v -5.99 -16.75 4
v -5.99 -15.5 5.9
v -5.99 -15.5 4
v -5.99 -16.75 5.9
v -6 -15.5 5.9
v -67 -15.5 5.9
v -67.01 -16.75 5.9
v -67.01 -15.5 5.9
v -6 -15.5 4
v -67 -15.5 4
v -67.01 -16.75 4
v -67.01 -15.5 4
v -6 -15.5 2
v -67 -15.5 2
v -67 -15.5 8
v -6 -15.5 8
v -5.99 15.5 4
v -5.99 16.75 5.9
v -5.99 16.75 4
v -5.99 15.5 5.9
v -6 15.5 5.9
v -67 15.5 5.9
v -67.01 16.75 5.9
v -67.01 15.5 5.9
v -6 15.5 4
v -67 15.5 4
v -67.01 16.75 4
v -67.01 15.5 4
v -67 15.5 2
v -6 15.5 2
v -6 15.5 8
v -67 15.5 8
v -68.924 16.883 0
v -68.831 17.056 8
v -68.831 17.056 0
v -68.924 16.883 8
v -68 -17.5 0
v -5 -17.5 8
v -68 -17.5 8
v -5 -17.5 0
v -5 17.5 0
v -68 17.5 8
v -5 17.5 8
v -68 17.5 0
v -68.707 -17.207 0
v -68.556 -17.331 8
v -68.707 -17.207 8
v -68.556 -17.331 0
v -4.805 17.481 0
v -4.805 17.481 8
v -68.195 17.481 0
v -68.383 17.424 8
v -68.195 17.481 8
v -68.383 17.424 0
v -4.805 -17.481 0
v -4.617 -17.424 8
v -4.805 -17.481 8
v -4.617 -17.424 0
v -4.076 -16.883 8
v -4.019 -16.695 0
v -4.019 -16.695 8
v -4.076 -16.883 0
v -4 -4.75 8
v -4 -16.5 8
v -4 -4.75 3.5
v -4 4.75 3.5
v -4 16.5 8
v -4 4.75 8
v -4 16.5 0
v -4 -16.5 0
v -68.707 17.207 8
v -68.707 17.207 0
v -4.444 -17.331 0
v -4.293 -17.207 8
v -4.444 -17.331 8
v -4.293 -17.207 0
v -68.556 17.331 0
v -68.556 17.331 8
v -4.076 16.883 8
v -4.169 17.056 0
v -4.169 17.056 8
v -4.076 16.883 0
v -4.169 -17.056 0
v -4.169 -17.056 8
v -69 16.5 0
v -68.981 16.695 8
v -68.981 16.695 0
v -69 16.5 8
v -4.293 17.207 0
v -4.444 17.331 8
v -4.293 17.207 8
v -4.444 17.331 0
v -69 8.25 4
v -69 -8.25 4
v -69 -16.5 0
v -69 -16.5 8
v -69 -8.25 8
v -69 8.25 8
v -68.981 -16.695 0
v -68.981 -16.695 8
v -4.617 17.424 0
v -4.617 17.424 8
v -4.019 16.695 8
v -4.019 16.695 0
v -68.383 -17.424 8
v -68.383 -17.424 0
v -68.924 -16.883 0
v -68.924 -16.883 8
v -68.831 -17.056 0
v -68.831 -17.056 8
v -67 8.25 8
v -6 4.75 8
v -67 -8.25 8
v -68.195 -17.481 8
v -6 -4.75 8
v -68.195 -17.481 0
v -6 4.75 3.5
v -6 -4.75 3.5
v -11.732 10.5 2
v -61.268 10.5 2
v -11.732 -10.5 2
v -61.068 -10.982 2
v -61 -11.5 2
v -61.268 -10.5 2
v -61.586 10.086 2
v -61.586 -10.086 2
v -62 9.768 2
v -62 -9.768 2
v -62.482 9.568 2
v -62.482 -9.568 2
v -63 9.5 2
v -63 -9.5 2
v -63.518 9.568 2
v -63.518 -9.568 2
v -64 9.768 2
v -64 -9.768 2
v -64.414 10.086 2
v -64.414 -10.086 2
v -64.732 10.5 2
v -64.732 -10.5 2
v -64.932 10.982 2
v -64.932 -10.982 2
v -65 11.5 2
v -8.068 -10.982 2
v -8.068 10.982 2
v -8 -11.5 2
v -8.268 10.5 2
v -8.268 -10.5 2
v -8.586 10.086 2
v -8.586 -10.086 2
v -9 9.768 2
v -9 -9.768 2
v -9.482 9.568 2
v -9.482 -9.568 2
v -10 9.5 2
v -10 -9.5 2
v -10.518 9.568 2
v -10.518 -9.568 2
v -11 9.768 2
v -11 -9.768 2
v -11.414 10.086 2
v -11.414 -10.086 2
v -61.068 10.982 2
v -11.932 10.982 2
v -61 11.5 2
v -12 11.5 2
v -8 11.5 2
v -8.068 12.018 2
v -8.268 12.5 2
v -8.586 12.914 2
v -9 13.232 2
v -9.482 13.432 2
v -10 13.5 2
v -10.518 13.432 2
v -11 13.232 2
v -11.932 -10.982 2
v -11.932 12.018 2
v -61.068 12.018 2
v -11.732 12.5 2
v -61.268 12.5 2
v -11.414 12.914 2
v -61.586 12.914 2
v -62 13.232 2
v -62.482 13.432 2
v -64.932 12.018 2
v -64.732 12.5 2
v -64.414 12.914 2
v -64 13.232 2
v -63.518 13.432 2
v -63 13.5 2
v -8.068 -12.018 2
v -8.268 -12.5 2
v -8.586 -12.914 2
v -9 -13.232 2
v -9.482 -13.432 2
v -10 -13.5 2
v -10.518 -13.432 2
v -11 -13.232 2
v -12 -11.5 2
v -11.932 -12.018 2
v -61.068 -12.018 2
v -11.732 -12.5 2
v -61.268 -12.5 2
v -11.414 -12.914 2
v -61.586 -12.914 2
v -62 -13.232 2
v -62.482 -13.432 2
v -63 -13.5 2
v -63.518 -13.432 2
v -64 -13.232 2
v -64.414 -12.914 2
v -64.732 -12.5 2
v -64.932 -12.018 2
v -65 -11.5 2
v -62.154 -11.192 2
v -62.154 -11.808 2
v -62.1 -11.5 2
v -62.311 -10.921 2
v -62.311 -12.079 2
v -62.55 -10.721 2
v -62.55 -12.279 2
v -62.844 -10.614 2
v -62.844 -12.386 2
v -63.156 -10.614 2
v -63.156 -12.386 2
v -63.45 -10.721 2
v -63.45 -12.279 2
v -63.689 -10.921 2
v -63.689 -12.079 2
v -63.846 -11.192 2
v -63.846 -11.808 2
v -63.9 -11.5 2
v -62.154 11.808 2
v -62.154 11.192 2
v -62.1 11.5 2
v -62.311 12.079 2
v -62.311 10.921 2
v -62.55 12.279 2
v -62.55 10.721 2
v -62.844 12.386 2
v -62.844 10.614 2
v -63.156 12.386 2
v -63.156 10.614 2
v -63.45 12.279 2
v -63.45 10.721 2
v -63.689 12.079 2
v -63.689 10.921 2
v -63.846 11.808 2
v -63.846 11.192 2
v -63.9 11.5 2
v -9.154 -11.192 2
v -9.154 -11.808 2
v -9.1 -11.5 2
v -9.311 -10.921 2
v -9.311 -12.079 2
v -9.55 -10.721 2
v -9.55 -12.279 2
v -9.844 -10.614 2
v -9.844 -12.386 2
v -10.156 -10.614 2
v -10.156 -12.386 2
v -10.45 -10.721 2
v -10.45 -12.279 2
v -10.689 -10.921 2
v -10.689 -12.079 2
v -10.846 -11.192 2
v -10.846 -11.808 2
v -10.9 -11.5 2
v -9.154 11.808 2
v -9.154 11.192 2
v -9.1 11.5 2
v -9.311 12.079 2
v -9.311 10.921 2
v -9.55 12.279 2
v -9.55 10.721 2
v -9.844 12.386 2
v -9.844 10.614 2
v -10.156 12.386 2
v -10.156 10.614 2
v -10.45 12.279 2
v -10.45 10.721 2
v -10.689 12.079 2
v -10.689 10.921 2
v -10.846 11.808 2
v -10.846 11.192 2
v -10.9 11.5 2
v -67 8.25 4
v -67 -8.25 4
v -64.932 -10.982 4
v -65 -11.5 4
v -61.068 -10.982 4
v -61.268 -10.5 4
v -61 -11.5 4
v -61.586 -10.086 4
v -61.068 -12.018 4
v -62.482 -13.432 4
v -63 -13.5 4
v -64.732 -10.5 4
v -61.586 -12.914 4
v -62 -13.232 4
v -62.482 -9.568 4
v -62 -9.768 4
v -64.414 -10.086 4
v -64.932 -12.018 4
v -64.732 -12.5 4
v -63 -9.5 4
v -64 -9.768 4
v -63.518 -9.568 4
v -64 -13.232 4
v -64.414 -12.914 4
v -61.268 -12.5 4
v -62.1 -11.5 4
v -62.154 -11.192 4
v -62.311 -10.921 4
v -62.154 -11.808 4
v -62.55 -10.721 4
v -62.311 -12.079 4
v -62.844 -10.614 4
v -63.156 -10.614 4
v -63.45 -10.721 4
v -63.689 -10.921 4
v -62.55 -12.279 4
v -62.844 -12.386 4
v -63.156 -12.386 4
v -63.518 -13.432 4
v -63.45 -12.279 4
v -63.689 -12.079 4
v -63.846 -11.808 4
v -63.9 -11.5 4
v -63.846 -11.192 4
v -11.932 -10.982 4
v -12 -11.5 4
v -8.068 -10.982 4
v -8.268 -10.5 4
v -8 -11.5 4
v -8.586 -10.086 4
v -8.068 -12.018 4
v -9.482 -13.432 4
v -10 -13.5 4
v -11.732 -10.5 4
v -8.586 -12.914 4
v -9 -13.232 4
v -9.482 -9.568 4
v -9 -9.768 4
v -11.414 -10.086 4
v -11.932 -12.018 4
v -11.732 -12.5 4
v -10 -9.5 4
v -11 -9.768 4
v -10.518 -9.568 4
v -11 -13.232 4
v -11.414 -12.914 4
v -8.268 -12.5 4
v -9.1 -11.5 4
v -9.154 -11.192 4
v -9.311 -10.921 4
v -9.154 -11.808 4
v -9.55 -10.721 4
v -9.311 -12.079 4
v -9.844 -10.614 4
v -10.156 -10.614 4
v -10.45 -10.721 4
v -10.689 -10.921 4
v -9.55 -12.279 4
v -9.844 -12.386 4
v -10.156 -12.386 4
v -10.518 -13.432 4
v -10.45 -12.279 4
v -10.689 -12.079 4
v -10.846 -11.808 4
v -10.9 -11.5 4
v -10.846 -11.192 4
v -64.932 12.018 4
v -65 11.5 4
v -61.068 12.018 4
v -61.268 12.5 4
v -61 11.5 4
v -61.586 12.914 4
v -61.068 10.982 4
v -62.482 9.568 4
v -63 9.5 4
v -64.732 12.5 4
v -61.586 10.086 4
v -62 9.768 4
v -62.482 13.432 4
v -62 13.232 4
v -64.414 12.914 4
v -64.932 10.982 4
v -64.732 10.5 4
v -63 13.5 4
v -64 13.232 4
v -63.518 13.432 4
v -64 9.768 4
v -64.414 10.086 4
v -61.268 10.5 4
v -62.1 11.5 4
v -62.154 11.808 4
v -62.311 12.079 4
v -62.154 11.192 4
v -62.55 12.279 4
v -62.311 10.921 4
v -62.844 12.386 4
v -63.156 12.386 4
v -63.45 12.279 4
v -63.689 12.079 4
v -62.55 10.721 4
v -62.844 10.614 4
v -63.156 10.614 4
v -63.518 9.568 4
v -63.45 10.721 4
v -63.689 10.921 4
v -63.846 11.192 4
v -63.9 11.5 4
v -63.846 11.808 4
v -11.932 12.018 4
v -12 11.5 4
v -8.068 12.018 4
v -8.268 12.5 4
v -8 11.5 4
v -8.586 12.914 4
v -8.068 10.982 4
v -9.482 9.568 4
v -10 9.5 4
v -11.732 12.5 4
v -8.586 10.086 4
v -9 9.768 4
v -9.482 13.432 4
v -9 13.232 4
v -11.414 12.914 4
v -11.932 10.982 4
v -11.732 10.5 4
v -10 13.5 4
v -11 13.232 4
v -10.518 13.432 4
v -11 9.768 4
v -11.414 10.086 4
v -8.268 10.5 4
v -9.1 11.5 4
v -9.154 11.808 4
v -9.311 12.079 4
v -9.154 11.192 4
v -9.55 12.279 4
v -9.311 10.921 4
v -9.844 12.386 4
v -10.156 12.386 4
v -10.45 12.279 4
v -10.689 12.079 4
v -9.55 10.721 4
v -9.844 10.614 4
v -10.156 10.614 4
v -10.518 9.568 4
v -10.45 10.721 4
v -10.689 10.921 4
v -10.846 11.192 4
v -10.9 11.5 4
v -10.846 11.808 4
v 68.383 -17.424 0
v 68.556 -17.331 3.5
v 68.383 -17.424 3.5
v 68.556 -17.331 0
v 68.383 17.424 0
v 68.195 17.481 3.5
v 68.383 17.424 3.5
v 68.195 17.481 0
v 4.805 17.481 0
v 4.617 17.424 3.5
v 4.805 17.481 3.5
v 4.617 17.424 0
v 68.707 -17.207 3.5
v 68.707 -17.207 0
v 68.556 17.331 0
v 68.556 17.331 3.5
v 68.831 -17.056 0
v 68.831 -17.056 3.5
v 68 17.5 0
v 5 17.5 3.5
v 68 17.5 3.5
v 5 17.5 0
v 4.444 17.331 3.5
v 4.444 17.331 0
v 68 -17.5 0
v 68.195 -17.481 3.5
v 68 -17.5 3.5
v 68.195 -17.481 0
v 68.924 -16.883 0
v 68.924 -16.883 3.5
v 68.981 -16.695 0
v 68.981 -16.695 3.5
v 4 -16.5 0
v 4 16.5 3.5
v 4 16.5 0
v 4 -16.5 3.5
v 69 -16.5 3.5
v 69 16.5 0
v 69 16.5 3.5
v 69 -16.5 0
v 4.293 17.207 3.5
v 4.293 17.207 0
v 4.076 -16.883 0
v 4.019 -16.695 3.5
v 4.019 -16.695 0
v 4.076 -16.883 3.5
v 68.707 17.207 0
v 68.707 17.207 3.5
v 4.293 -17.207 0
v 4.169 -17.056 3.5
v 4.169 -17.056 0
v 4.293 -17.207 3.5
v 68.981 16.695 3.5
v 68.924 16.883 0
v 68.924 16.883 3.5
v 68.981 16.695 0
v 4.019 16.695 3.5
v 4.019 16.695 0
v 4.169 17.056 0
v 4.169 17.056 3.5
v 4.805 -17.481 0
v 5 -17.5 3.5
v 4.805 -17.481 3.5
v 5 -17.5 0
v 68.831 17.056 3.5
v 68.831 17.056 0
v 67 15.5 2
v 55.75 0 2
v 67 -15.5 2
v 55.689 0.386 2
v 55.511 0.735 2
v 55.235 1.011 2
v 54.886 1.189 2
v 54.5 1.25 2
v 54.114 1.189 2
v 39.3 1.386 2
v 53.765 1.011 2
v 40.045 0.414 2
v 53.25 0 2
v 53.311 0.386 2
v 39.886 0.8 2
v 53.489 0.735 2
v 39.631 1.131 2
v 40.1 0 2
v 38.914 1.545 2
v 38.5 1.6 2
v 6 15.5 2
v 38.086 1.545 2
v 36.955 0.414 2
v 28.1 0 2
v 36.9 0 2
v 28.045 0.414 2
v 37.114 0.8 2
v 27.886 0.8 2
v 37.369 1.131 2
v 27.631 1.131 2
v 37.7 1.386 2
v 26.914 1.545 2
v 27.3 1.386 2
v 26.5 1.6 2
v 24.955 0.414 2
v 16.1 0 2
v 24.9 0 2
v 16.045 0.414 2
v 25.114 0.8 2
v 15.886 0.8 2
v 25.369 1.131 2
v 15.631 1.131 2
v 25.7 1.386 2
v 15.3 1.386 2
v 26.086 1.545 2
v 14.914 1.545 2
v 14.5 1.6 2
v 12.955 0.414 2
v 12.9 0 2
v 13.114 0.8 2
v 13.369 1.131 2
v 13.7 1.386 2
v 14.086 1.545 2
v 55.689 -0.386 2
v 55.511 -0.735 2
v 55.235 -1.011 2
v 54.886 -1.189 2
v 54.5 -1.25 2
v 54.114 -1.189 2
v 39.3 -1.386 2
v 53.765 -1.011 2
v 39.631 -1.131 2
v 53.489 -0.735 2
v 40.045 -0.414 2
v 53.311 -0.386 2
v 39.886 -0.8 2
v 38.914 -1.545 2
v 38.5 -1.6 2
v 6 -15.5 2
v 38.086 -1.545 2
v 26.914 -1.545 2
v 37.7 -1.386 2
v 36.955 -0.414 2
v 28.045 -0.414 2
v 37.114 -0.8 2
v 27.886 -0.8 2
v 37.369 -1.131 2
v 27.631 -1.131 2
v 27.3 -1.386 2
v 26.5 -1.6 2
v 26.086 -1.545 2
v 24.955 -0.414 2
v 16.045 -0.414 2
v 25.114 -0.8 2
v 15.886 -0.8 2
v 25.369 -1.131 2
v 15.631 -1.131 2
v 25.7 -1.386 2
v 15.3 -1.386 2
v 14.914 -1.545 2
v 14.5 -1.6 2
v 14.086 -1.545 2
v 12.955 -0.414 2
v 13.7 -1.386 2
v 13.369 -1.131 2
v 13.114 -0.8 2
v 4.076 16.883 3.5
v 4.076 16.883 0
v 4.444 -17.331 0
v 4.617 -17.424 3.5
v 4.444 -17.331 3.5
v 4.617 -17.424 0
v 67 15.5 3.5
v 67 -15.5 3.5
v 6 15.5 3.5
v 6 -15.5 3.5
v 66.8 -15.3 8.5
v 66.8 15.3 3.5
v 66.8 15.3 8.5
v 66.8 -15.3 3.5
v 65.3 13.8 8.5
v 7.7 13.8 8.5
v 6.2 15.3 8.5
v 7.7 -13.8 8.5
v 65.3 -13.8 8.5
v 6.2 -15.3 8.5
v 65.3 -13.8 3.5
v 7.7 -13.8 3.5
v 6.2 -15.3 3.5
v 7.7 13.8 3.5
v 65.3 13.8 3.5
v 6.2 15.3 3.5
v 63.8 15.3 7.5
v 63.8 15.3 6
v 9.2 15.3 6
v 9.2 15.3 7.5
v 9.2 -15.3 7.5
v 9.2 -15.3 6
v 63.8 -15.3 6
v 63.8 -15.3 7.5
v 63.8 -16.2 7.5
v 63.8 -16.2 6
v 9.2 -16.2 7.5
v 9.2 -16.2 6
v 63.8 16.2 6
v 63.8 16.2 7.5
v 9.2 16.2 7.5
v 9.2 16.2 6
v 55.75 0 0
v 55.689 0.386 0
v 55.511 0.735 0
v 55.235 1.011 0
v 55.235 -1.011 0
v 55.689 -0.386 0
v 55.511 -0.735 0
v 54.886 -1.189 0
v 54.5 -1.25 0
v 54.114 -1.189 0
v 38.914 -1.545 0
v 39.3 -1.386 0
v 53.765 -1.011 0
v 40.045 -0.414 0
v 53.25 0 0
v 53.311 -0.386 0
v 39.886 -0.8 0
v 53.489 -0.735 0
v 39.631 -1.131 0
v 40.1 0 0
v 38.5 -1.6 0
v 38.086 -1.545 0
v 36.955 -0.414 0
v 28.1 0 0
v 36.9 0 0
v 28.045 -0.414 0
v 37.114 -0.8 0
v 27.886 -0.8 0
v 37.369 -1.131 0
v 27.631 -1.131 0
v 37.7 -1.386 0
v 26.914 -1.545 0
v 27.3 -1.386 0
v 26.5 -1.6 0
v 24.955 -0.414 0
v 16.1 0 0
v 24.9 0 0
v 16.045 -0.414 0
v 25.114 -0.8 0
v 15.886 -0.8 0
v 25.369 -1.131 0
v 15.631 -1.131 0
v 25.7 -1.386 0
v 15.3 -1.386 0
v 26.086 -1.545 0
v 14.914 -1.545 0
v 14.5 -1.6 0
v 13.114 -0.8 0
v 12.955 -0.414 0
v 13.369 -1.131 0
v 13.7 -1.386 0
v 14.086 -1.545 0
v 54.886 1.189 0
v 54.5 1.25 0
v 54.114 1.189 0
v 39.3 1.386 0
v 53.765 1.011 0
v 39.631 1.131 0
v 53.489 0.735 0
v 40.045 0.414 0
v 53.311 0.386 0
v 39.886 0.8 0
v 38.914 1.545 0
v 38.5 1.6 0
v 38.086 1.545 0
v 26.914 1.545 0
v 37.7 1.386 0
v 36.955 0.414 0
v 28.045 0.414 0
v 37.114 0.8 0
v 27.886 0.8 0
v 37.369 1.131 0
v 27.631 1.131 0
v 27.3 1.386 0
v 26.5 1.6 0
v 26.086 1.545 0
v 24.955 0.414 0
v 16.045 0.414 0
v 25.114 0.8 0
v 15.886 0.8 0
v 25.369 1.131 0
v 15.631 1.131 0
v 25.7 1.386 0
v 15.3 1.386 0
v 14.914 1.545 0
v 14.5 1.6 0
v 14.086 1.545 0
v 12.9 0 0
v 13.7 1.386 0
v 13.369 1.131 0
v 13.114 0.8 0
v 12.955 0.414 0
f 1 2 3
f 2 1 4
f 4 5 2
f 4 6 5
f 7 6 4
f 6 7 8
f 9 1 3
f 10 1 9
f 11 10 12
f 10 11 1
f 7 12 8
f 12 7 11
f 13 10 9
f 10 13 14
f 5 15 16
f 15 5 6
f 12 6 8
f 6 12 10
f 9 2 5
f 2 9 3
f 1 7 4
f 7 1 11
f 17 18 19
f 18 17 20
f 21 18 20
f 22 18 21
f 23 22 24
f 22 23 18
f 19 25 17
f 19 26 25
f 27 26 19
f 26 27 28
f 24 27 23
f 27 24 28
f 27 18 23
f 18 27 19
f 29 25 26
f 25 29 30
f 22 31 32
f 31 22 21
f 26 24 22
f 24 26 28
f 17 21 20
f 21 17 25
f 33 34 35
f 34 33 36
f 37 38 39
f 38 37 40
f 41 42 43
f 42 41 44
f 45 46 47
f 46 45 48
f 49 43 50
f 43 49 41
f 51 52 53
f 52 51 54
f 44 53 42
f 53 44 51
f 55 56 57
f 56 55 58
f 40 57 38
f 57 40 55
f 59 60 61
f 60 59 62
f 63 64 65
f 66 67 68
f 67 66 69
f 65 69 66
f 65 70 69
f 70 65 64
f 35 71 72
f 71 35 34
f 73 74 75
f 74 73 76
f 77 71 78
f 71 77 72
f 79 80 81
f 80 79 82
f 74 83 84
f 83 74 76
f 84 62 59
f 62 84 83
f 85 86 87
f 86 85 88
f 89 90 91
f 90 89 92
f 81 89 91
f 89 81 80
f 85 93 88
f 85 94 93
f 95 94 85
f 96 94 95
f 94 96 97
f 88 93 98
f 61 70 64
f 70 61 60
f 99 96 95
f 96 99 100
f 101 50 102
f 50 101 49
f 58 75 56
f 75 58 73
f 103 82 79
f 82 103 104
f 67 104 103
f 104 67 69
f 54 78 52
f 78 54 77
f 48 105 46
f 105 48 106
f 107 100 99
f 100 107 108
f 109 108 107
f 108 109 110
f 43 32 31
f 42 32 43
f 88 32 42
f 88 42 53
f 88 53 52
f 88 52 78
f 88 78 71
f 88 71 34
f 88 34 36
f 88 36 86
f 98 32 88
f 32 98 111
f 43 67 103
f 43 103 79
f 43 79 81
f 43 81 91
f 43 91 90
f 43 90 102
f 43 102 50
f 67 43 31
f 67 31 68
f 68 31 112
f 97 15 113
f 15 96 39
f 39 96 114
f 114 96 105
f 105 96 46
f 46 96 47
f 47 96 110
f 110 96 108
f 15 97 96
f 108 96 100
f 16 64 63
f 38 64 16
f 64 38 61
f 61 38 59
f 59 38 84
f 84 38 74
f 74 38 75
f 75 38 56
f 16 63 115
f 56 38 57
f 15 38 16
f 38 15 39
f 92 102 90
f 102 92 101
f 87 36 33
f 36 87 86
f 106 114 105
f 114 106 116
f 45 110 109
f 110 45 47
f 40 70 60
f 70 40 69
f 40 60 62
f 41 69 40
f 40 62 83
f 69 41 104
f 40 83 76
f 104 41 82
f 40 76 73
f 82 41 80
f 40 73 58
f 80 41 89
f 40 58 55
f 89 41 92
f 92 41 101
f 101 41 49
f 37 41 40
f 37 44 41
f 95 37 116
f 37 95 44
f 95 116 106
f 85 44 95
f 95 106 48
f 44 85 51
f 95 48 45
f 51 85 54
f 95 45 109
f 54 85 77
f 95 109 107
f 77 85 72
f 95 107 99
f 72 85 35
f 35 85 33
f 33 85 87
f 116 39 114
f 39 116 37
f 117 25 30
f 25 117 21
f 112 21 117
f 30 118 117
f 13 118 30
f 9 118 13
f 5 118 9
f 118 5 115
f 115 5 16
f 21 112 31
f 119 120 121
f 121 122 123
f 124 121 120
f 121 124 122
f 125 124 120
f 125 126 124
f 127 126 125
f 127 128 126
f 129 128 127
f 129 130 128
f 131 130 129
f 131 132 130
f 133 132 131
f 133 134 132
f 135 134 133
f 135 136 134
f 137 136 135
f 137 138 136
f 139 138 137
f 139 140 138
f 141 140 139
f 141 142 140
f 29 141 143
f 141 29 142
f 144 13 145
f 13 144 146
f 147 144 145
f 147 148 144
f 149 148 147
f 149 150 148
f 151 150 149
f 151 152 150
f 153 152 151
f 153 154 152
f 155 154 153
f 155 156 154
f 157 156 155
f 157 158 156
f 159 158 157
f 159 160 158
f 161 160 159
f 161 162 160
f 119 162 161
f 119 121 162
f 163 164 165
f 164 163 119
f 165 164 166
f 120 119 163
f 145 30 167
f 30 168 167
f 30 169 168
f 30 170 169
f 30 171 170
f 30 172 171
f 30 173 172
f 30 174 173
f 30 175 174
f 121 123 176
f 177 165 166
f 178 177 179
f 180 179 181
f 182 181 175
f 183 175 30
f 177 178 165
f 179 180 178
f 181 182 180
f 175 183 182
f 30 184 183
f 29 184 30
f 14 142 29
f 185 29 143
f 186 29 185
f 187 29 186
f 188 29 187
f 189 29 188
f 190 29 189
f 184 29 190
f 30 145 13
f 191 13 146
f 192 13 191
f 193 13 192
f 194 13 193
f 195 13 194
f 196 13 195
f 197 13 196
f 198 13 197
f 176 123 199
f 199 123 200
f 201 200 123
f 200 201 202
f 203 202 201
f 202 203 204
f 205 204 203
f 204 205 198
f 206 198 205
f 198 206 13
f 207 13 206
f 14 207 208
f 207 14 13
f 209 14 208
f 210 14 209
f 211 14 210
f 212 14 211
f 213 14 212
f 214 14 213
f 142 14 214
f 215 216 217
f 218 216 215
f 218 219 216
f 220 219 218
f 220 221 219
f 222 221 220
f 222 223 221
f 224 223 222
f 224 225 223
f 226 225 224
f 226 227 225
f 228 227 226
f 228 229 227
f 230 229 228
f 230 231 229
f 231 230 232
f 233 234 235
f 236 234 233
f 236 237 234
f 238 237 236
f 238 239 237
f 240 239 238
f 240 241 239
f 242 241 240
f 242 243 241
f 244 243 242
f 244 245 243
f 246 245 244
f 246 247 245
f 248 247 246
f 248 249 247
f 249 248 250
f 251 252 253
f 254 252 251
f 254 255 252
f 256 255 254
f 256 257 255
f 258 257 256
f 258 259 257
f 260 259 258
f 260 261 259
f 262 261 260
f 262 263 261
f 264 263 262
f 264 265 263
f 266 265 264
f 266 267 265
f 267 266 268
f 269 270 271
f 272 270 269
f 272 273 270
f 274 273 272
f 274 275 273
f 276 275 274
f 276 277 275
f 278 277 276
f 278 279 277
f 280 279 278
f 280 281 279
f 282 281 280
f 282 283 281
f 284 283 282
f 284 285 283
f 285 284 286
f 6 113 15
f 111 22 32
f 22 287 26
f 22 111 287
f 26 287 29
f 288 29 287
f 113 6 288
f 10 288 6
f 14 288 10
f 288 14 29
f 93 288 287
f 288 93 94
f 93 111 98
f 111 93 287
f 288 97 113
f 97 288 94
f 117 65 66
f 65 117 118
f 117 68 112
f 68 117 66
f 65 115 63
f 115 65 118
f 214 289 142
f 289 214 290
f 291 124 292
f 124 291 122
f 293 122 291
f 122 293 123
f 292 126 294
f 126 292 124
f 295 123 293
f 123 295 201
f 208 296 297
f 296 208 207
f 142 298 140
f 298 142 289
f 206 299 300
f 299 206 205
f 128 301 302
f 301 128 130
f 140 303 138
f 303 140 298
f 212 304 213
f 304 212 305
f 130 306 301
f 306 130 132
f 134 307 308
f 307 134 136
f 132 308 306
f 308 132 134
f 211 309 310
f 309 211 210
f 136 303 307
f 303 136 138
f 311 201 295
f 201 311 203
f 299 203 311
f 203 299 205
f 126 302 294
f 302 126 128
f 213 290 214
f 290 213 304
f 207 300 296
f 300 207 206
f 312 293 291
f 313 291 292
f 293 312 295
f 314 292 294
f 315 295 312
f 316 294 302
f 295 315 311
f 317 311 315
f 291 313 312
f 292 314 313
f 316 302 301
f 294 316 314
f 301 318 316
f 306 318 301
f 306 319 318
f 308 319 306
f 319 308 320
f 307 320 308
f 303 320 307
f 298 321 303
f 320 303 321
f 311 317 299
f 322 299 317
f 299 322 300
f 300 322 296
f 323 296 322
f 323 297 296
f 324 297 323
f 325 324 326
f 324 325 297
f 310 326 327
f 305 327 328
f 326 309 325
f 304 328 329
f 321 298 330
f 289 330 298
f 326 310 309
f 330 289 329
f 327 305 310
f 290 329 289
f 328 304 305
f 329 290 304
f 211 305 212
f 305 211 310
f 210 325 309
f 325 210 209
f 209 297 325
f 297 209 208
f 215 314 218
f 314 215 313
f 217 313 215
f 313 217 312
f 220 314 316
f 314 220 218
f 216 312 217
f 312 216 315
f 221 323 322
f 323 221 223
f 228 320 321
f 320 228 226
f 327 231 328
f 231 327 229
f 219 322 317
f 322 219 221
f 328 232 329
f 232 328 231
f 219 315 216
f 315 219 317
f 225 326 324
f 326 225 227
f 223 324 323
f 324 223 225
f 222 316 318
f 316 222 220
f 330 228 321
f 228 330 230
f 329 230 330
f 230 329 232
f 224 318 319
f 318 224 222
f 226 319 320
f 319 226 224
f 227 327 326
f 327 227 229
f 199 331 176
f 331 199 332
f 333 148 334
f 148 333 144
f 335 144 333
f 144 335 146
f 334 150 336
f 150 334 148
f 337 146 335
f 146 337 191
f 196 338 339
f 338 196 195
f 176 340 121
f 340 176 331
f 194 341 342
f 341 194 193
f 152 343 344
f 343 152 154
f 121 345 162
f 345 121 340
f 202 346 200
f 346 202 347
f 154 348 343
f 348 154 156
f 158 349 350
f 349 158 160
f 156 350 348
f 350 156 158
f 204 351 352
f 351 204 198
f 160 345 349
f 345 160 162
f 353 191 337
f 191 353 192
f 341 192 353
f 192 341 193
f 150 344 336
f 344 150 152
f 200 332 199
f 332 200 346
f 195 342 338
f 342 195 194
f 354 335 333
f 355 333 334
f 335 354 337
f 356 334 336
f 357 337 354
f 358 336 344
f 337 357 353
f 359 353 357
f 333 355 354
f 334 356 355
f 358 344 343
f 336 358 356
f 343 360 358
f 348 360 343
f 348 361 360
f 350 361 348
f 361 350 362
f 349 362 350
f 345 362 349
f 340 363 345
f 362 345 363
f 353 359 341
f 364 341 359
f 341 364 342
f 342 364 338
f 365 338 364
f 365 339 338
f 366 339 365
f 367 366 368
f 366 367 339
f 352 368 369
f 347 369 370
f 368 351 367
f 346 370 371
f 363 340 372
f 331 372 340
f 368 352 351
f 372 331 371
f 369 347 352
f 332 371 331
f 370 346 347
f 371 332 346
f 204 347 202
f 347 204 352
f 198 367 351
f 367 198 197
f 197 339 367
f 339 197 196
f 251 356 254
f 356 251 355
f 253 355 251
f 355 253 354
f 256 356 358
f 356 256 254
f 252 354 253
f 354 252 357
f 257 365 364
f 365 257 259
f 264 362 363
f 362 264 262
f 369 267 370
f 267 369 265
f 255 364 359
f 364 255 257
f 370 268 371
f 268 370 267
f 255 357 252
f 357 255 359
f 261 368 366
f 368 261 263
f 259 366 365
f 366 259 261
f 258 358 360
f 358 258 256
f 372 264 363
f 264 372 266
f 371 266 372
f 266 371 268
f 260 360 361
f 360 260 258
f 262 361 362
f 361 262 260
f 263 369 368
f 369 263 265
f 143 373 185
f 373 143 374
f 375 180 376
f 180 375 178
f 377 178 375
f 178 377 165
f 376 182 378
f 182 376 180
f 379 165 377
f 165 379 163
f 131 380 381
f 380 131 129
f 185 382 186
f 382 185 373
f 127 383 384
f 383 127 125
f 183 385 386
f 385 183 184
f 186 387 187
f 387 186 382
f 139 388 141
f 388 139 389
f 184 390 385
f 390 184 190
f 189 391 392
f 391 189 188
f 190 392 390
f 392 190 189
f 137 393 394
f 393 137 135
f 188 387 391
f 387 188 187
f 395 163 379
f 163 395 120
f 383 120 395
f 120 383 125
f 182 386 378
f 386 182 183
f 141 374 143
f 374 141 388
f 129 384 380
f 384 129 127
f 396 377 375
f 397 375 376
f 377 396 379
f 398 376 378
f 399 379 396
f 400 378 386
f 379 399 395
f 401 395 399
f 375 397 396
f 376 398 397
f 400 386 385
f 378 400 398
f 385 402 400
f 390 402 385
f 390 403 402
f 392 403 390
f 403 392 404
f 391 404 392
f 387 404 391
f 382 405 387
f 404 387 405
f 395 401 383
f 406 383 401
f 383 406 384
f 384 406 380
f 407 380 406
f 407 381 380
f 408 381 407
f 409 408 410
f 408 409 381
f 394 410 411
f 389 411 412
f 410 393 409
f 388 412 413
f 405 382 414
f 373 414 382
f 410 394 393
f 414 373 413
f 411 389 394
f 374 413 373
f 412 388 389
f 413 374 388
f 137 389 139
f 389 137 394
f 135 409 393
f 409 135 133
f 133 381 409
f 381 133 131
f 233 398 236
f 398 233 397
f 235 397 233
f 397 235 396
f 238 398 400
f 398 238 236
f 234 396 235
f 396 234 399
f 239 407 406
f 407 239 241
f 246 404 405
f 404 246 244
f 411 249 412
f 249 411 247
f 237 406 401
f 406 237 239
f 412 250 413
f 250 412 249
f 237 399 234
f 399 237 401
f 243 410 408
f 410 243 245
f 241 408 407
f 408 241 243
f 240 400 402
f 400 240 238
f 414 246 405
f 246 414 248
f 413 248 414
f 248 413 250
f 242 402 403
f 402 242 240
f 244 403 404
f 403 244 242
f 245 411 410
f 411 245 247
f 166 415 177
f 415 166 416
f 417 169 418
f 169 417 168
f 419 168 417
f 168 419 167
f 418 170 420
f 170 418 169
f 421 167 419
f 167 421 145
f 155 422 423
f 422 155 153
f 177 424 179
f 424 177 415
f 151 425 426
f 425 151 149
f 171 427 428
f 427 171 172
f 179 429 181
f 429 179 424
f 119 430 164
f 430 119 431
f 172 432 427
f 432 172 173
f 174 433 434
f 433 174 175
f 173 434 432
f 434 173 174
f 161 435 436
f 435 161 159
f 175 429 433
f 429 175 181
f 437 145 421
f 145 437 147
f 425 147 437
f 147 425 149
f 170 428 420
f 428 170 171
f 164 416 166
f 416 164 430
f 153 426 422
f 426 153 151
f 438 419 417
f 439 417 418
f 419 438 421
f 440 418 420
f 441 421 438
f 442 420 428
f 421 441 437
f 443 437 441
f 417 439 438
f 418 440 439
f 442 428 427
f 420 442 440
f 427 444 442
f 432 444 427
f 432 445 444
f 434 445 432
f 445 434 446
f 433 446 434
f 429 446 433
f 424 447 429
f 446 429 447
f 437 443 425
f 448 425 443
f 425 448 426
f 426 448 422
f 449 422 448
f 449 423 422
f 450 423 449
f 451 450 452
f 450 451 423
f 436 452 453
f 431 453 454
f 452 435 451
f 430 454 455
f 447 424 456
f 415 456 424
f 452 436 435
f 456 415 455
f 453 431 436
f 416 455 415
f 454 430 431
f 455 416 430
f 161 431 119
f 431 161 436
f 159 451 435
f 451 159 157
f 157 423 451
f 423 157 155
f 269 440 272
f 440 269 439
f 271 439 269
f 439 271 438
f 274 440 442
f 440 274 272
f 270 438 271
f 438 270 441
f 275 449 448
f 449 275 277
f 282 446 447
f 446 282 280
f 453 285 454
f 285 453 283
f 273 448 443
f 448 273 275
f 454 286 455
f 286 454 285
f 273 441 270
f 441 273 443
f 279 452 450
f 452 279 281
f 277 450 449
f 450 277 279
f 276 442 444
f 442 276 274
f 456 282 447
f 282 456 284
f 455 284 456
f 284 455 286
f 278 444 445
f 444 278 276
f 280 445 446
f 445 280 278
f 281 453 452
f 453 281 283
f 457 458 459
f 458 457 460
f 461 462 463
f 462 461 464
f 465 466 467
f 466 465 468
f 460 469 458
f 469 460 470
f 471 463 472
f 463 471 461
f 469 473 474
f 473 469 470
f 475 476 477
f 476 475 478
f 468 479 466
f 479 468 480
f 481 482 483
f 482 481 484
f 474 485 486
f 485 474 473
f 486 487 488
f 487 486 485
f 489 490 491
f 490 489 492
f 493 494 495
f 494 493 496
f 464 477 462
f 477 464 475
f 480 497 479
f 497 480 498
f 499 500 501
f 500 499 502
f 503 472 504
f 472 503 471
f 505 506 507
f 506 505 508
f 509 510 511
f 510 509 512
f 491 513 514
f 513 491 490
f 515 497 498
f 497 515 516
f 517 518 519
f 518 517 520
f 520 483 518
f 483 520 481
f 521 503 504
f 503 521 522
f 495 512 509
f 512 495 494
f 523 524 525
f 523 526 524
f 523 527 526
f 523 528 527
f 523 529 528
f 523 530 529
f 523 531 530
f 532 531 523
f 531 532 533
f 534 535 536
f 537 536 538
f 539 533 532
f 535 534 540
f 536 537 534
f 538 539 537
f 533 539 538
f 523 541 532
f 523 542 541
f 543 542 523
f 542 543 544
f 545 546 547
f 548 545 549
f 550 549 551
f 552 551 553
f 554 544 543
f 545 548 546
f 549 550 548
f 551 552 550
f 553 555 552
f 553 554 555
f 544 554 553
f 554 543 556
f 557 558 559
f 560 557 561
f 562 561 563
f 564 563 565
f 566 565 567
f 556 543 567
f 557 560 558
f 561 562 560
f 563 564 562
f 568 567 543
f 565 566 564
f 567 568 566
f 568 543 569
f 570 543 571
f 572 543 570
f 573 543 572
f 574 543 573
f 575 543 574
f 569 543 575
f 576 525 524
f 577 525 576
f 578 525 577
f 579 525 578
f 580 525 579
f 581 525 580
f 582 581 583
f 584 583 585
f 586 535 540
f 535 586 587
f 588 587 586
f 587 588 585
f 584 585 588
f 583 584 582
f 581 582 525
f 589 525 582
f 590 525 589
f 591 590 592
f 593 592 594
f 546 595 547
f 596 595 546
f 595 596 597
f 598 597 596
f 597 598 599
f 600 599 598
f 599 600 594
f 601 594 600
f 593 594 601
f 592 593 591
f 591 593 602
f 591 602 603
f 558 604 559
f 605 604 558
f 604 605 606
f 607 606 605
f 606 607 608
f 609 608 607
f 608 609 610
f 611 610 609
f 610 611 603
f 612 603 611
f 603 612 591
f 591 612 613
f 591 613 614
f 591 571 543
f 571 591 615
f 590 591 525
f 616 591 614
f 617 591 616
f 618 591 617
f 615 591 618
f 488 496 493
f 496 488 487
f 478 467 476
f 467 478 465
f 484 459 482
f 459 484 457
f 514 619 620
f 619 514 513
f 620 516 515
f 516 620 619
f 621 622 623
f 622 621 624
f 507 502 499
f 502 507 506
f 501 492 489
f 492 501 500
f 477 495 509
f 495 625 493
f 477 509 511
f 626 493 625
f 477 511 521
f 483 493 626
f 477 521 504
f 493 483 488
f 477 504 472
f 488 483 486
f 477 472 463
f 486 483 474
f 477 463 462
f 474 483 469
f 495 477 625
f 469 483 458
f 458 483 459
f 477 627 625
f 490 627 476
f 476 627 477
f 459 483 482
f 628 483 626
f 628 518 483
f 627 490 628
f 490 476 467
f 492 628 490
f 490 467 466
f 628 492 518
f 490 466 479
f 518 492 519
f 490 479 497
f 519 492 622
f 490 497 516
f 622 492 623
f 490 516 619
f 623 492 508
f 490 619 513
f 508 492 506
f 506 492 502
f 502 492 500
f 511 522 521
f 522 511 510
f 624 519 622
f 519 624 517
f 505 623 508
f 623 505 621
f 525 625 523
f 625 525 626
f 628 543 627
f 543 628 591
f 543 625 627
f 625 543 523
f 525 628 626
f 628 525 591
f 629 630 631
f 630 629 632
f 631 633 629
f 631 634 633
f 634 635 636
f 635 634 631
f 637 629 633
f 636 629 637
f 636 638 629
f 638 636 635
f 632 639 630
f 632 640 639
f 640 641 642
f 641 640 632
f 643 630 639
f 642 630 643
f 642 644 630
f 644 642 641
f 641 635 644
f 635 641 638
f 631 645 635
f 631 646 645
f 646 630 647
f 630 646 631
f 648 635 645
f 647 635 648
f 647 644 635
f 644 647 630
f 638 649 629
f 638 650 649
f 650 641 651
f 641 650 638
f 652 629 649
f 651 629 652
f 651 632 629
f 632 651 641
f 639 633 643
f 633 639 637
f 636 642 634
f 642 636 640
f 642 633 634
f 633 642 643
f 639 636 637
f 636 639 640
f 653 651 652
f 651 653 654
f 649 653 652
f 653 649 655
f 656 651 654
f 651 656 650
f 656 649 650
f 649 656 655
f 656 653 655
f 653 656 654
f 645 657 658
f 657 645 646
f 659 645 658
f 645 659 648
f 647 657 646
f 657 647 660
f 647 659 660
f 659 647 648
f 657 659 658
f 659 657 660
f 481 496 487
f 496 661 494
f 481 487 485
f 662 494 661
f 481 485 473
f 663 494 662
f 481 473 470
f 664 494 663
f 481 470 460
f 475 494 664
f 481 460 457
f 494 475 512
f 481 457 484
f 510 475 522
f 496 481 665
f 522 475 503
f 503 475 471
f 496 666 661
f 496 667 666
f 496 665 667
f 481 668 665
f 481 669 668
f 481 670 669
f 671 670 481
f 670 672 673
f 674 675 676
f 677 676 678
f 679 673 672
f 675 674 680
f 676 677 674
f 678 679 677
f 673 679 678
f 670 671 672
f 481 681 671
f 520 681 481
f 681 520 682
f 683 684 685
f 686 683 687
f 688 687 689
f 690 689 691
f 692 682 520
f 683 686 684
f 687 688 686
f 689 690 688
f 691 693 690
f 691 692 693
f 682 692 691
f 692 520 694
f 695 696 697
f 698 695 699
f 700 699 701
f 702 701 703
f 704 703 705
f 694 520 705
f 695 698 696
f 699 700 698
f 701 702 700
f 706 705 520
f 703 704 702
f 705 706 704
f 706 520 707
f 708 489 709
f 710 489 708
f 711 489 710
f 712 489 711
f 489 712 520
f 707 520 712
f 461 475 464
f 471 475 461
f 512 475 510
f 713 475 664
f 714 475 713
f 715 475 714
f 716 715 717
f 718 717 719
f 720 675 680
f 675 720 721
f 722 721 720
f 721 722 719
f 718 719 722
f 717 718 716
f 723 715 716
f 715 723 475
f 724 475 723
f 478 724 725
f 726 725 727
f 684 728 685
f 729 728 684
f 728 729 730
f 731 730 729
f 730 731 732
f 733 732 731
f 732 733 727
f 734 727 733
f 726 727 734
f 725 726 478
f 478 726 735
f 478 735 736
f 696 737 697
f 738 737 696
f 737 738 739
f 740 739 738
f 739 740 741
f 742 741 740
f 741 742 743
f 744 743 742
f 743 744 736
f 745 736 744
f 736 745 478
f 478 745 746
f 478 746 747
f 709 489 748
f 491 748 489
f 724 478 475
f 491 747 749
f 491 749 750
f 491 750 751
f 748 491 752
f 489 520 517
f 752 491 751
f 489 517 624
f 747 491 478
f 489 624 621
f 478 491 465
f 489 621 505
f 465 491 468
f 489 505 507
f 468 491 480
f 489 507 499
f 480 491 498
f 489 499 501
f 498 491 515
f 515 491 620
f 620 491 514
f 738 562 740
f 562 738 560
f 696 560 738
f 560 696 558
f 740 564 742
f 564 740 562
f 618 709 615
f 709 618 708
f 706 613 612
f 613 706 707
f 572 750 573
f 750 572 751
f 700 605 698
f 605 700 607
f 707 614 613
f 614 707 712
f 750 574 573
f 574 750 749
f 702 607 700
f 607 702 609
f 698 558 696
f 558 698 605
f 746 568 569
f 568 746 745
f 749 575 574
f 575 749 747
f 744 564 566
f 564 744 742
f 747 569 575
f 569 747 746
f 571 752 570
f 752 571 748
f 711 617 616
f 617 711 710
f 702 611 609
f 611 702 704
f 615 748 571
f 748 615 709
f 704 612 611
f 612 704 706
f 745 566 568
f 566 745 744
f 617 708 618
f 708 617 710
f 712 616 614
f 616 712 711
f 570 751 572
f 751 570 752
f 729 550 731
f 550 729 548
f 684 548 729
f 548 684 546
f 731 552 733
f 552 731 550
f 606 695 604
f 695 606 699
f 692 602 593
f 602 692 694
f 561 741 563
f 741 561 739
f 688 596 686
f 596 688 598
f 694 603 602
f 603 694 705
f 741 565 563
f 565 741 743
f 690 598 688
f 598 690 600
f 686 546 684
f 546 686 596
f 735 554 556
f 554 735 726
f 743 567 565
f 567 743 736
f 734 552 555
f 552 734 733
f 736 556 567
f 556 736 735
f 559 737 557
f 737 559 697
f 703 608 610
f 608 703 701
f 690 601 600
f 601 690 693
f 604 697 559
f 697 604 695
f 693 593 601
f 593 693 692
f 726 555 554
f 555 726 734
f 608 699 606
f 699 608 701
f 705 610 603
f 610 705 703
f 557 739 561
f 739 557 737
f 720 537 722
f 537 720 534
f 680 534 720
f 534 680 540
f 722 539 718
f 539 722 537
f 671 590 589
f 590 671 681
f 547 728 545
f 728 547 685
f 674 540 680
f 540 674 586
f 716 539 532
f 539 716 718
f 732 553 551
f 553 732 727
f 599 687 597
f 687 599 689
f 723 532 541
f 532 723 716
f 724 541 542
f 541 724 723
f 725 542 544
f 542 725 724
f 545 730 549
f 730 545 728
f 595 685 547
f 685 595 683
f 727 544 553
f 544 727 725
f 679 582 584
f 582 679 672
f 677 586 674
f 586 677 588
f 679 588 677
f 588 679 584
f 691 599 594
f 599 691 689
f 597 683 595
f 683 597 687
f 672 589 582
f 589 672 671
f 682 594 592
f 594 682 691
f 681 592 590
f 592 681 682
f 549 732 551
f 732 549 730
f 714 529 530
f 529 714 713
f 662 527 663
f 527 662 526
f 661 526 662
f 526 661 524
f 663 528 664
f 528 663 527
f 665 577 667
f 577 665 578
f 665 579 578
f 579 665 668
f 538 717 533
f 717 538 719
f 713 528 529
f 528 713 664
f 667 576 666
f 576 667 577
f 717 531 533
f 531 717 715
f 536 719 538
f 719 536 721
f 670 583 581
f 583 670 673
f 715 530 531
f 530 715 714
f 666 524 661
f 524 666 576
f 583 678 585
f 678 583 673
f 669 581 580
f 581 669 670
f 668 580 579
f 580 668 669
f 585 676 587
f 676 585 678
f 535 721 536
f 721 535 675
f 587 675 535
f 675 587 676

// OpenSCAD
// PoEt Rev A — parametric snap-fit enclosure
// Board: 60 × 30 mm, 4-layer, 1.6 mm thick
//
// Print orientation (both parts are already in print-ready orientation)
//   Bottom shell : open face UP  — no rotation needed
//   Top shell    : ceiling face DOWN (Z=0) — no rotation needed; skirt prints upward
//                  Flip physically to assemble: press skirt into bottom shell until beads click
//
// VERIFY clr_top and all connector dimensions against real parts before printing.
// Print a single-wall cross-section first.

/* ═══ Board dimensions ═══════════════════════════════════════════════════ */
pcb_l = 60.0;   // board length (X)
pcb_w = 30.0;   // board width  (Y)
pcb_t =  1.6;   // board thickness

/* ═══ Interior clearances ════════════════════════════════════════════════ */
clr_bot  = 2.0;  // floor to PCB bottom  (standoff height)
clr_top  = 12.0; // PCB top to ceiling inner face
                  // T1 transformer (Würth 750313638) ≈ 10 mm → 12 mm = 2 mm headroom
clr_side = 0.5;  // per-side gap between PCB edge and inner wall

/* ═══ Wall & snap geometry ═══════════════════════════════════════════════ */
wall    = 2.0;   // shell wall thickness
skirt_t = 1.5;   // top-shell inner skirt thickness
overlap = 5.0;   // skirt insertion depth into bottom shell
fit_gap = 0.2;   // radial clearance: skirt OD vs cavity ID (each side)

bead_h  = 1.5;   // snap bead height (Z)
bead_d  = 0.9;   // snap bead radial depth (into wall groove)
grove_tol = 0.2; // extra groove width per side for tolerance

/* ═══ Connector cutouts ══════════════════════════════════════════════════ */
// RJ45 — Bel Fuse 0826-1G1T-DV-F, back face (X-min end, "PAIR" end of board)
rj45_w = 16.5;  // opening width  (Y)  — verify against datasheet
rj45_h = 14.5;  // opening height (Z)  — includes LED indicators above body

// USB-C — GCT USB4105-GF-A mid-mount, front face (X-max end of board)
usbc_w =  9.5;  // opening width  (Y)
usbc_h =  4.5;  // opening height (Z): mid-mount body ≈ 3.3 mm + plug clearance

/* ═══ LED windows — top face ══════════════════════════════════════════════ */
// LED1=LINK (green), LED2=ACT (yellow), LED3=PWR (blue); see docs/bom.md.
// Positions measured from X=0 (RJ45 end) of PCB. Adjust to match KiCad layout.
led_dia  = 3.2;          // window bore (slightly over 3 mm LED lens)
led_xpos = [8, 20, 32];  // X from RJ45 end (PCB coords)
led_ypos = 15.0;         // Y from Y=0 edge (PCB coord, = board centre)

/* ═══ Reset-button pinhole ════════════════════════════════════════════════ */
// SW1 tact switch (Sheet 04). Adjust to match KiCad placement.
sw_dia  = 2.5;   // bore for a 2 mm tool
sw_xpos = 48.0;  // X from RJ45 end (PCB coord)
sw_ypos = 15.0;  // Y from Y=0 edge (PCB coord)

/* ═══ PCB standoffs ══════════════════════════════════════════════════════ */
so_od = 4.0;  // standoff outer diameter
so_id = 1.8;  // screw bore (M2 self-tap); set to 0 for solid boss
// Standoff XY centres in PCB coordinates (from PCB corner at X=0, Y=0)
so_pos = [[3.5, 3.5], [56.5, 3.5], [3.5, 26.5], [56.5, 26.5]];

/* ═══ Derived dimensions ══════════════════════════════════════════════════ */
out_l = pcb_l + 2*clr_side + 2*wall;
out_w = pcb_w + 2*clr_side + 2*wall;

// Bottom shell height: tall enough so groove doesn't punch through floor
// floor=wall, clr_bot=2, pcb_t=1.6 → floor-to-PCB-top = 5.6; add 2 mm above PCB
bot_h = max(8.0, wall + clr_bot + pcb_t + 2.0);

// Top shell height (ceiling plate + headroom above PCB)
top_h = wall + clr_top;

// Inner cavity XY (the hollow inside the shell walls)
cav_l = out_l - 2*wall;
cav_w = out_w - 2*wall;

// Snap groove in bottom-shell inner wall, measured from shell floor
groove_w   = bead_h + 2*grove_tol;
groove_z   = bot_h - 2.5 - bead_h;   // 2.5 mm below top rim
groove_dep = fit_gap + bead_d + 0.15; // depth cut into inner wall face

// Snap bead on skirt (Z from skirt bottom) aligned with groove when assembled
bead_z_sk = groove_z - bot_h + overlap;

// Skirt outer and inner dimensions (centred in XY)
sk_ol = cav_l - 2*fit_gap;  // skirt outer length
sk_ow = cav_w - 2*fit_gap;  // skirt outer width
sk_il = sk_ol - 2*skirt_t;  // skirt inner length
sk_iw = sk_ow - 2*skirt_t;  // skirt inner width

// Origin used throughout: shell body centred in XY, floor at Z=0
// PCB origin (X=0,Y=0 corner of board) maps to shell coords:
//   pcb_x0 = -out_l/2 + wall + clr_side
//   pcb_y0 = -out_w/2 + wall + clr_side

function pcb2x(x) = -out_l/2 + wall + clr_side + x;
function pcb2y(y) = -out_w/2 + wall + clr_side + y;

/* ═══ Utility ════════════════════════════════════════════════════════════ */
module rbox(l, w, h, r=1.0) {
    // Rounded-corner box, centred in XY, bottom at Z=0
    hull()
        for (sx=[-1,1], sy=[-1,1])
            translate([sx*(l/2-r), sy*(w/2-r), 0])
                cylinder(r=r, h=h, $fn=32);
}

module ccube(lx, ly, lz) {
    // Cube centred in XY, bottom at Z=0
    translate([-lx/2, -ly/2, 0]) cube([lx, ly, lz]);
}

/* ═══ Bottom shell ═══════════════════════════════════════════════════════ */
module bottom_shell() {
    difference() {
        rbox(out_l, out_w, bot_h);

        // ── Interior cavity (open top) ───────────────────────────────── //
        translate([0, 0, wall])
            ccube(cav_l, cav_w, bot_h);  // extra height is fine — just removes air

        // ── Snap grooves in the two long inner walls (+Y and -Y) ─────── //
        // Cut a channel outward from the inner face into the wall material
        for (sy = [-1, 1]) {
            // inner face at y = sy*cav_w/2; groove goes further out by groove_dep
            gy = sy * (cav_w/2 + groove_dep/2);
            translate([0, gy, groove_z + groove_w/2])
                cube([cav_l + 0.02, groove_dep, groove_w], center=true);
        }

        // ── RJ45 cutout — back face (X = -out_l/2) ──────────────────── //
        // Board sits so the RJ45 end is at the -X wall
        translate([-out_l/2 - 0.01,
                   -rj45_w/2,
                   wall + clr_bot])
            cube([wall + 0.02, rj45_w, rj45_h]);

        // ── USB-C cutout — front face (X = +out_l/2) ────────────────── //
        // Mid-mount: opening from just above floor to usbc_h
        translate([out_l/2 - wall - 0.01,
                   -usbc_w/2,
                   wall + clr_bot - 0.5])   // 0.5 mm below PCB-bottom floor
            cube([wall + 0.02, usbc_w, usbc_h + 1.0]);
    }

    // ── PCB standoffs ────────────────────────────────────────────────── //
    for (p = so_pos) {
        translate([pcb2x(p[0]), pcb2y(p[1]), wall])
            difference() {
                cylinder(d=so_od, h=clr_bot, $fn=24);
                if (so_id > 0)
                    cylinder(d=so_id, h=clr_bot + 0.01, $fn=18);
            }
    }
}

/* ═══ Top shell ══════════════════════════════════════════════════════════ */
// Print orientation: Z=0 = ceiling outer face (on bed); everything else
// extends upward in positive Z (rim, skirt, beads all point toward sky while
// printing). In the assembled case, the top shell is flipped so the ceiling
// faces upward and the skirt drops into the bottom shell.
//
// Z landmarks (in print orientation, Z=0 on bed):
//   0               ceiling outer face (bed)
//   wall            ceiling inner face
//   wall+rim_h      top of cosmetic rim
//   wall+rim_h+overlap  top of skirt (= shell interior side)
module top_shell() {
    rim_h   = 1.5;  // cosmetic outer rim height
    skirt_z = wall + rim_h;  // Z where skirt starts

    // Snap bead Z centre in print coords:
    // In assembly the bead is bead_z_sk from the skirt tip (the end that
    // enters the bottom shell). In print orientation, that tip is at the
    // FAR end from the bed (Z = skirt_z + overlap). Count inward by
    // bead_z_sk + bead_h/2 to find the bead centre.
    bead_zc = skirt_z + overlap - bead_z_sk - bead_h/2;

    difference() {
        union() {
            // ── Ceiling plate ─────────────────────────────────────────── //
            rbox(out_l, out_w, wall);

            // ── Cosmetic outer rim above ceiling ──────────────────────── //
            translate([0, 0, wall])
                difference() {
                    rbox(out_l, out_w, rim_h);
                    ccube(cav_l, cav_w, rim_h + 0.01);
                }

            // ── Inner snap skirt ──────────────────────────────────────── //
            translate([0, 0, skirt_z])
                difference() {
                    ccube(sk_ol, sk_ow, overlap);
                    ccube(sk_il, sk_iw, overlap + 0.01);
                }

            // ── Snap beads on long skirt faces (+Y and -Y) ────────────── //
            for (sy = [-1, 1]) {
                translate([0,
                           sy * (sk_ow/2 + bead_d/2),
                           bead_zc])
                    cube([sk_ol - 6, bead_d, bead_h], center=true);
            }
        }

        // ── LED windows through ceiling (bore from outer face inward) ── //
        for (i = [0 : len(led_xpos)-1]) {
            translate([pcb2x(led_xpos[i]), pcb2y(led_ypos), -0.01])
                cylinder(d=led_dia, h=wall + 0.02, $fn=24);
        }

        // ── Reset-button pinhole ──────────────────────────────────────── //
        translate([pcb2x(sw_xpos), pcb2y(sw_ypos), -0.01])
            cylinder(d=sw_dia, h=wall + 0.02, $fn=20);
    }
}

/* ═══ Print layout ═══════════════════════════════════════════════════════ */
spacing = out_l + 8;

// Bottom shell: open face up — no rotation needed
translate([-spacing/2, 0, 0])
    bottom_shell();

// Top shell: already in print orientation (ceiling outer face at Z=0)
translate([spacing/2, 0, 0])
    top_shell();
